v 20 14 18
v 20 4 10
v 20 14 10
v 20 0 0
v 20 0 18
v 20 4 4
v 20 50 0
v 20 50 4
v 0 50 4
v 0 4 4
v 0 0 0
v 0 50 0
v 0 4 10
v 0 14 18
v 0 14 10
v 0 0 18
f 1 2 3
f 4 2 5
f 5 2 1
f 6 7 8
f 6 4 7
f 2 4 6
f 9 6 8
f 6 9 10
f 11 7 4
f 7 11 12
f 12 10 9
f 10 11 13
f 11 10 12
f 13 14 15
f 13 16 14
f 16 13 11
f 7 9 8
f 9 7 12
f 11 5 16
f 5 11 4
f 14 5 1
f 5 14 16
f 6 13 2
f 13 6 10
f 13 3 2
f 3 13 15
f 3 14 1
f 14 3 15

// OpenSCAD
ledge_thickness = 6;
width = 20;
thickness = 8;

union() {
  cube([width, 50, 4]);
  cube([width, 4, ledge_thickness + 4 + thickness]);
  translate([0, 0, ledge_thickness + 4])
  cube([width, 10 + 4, thickness]);
}
